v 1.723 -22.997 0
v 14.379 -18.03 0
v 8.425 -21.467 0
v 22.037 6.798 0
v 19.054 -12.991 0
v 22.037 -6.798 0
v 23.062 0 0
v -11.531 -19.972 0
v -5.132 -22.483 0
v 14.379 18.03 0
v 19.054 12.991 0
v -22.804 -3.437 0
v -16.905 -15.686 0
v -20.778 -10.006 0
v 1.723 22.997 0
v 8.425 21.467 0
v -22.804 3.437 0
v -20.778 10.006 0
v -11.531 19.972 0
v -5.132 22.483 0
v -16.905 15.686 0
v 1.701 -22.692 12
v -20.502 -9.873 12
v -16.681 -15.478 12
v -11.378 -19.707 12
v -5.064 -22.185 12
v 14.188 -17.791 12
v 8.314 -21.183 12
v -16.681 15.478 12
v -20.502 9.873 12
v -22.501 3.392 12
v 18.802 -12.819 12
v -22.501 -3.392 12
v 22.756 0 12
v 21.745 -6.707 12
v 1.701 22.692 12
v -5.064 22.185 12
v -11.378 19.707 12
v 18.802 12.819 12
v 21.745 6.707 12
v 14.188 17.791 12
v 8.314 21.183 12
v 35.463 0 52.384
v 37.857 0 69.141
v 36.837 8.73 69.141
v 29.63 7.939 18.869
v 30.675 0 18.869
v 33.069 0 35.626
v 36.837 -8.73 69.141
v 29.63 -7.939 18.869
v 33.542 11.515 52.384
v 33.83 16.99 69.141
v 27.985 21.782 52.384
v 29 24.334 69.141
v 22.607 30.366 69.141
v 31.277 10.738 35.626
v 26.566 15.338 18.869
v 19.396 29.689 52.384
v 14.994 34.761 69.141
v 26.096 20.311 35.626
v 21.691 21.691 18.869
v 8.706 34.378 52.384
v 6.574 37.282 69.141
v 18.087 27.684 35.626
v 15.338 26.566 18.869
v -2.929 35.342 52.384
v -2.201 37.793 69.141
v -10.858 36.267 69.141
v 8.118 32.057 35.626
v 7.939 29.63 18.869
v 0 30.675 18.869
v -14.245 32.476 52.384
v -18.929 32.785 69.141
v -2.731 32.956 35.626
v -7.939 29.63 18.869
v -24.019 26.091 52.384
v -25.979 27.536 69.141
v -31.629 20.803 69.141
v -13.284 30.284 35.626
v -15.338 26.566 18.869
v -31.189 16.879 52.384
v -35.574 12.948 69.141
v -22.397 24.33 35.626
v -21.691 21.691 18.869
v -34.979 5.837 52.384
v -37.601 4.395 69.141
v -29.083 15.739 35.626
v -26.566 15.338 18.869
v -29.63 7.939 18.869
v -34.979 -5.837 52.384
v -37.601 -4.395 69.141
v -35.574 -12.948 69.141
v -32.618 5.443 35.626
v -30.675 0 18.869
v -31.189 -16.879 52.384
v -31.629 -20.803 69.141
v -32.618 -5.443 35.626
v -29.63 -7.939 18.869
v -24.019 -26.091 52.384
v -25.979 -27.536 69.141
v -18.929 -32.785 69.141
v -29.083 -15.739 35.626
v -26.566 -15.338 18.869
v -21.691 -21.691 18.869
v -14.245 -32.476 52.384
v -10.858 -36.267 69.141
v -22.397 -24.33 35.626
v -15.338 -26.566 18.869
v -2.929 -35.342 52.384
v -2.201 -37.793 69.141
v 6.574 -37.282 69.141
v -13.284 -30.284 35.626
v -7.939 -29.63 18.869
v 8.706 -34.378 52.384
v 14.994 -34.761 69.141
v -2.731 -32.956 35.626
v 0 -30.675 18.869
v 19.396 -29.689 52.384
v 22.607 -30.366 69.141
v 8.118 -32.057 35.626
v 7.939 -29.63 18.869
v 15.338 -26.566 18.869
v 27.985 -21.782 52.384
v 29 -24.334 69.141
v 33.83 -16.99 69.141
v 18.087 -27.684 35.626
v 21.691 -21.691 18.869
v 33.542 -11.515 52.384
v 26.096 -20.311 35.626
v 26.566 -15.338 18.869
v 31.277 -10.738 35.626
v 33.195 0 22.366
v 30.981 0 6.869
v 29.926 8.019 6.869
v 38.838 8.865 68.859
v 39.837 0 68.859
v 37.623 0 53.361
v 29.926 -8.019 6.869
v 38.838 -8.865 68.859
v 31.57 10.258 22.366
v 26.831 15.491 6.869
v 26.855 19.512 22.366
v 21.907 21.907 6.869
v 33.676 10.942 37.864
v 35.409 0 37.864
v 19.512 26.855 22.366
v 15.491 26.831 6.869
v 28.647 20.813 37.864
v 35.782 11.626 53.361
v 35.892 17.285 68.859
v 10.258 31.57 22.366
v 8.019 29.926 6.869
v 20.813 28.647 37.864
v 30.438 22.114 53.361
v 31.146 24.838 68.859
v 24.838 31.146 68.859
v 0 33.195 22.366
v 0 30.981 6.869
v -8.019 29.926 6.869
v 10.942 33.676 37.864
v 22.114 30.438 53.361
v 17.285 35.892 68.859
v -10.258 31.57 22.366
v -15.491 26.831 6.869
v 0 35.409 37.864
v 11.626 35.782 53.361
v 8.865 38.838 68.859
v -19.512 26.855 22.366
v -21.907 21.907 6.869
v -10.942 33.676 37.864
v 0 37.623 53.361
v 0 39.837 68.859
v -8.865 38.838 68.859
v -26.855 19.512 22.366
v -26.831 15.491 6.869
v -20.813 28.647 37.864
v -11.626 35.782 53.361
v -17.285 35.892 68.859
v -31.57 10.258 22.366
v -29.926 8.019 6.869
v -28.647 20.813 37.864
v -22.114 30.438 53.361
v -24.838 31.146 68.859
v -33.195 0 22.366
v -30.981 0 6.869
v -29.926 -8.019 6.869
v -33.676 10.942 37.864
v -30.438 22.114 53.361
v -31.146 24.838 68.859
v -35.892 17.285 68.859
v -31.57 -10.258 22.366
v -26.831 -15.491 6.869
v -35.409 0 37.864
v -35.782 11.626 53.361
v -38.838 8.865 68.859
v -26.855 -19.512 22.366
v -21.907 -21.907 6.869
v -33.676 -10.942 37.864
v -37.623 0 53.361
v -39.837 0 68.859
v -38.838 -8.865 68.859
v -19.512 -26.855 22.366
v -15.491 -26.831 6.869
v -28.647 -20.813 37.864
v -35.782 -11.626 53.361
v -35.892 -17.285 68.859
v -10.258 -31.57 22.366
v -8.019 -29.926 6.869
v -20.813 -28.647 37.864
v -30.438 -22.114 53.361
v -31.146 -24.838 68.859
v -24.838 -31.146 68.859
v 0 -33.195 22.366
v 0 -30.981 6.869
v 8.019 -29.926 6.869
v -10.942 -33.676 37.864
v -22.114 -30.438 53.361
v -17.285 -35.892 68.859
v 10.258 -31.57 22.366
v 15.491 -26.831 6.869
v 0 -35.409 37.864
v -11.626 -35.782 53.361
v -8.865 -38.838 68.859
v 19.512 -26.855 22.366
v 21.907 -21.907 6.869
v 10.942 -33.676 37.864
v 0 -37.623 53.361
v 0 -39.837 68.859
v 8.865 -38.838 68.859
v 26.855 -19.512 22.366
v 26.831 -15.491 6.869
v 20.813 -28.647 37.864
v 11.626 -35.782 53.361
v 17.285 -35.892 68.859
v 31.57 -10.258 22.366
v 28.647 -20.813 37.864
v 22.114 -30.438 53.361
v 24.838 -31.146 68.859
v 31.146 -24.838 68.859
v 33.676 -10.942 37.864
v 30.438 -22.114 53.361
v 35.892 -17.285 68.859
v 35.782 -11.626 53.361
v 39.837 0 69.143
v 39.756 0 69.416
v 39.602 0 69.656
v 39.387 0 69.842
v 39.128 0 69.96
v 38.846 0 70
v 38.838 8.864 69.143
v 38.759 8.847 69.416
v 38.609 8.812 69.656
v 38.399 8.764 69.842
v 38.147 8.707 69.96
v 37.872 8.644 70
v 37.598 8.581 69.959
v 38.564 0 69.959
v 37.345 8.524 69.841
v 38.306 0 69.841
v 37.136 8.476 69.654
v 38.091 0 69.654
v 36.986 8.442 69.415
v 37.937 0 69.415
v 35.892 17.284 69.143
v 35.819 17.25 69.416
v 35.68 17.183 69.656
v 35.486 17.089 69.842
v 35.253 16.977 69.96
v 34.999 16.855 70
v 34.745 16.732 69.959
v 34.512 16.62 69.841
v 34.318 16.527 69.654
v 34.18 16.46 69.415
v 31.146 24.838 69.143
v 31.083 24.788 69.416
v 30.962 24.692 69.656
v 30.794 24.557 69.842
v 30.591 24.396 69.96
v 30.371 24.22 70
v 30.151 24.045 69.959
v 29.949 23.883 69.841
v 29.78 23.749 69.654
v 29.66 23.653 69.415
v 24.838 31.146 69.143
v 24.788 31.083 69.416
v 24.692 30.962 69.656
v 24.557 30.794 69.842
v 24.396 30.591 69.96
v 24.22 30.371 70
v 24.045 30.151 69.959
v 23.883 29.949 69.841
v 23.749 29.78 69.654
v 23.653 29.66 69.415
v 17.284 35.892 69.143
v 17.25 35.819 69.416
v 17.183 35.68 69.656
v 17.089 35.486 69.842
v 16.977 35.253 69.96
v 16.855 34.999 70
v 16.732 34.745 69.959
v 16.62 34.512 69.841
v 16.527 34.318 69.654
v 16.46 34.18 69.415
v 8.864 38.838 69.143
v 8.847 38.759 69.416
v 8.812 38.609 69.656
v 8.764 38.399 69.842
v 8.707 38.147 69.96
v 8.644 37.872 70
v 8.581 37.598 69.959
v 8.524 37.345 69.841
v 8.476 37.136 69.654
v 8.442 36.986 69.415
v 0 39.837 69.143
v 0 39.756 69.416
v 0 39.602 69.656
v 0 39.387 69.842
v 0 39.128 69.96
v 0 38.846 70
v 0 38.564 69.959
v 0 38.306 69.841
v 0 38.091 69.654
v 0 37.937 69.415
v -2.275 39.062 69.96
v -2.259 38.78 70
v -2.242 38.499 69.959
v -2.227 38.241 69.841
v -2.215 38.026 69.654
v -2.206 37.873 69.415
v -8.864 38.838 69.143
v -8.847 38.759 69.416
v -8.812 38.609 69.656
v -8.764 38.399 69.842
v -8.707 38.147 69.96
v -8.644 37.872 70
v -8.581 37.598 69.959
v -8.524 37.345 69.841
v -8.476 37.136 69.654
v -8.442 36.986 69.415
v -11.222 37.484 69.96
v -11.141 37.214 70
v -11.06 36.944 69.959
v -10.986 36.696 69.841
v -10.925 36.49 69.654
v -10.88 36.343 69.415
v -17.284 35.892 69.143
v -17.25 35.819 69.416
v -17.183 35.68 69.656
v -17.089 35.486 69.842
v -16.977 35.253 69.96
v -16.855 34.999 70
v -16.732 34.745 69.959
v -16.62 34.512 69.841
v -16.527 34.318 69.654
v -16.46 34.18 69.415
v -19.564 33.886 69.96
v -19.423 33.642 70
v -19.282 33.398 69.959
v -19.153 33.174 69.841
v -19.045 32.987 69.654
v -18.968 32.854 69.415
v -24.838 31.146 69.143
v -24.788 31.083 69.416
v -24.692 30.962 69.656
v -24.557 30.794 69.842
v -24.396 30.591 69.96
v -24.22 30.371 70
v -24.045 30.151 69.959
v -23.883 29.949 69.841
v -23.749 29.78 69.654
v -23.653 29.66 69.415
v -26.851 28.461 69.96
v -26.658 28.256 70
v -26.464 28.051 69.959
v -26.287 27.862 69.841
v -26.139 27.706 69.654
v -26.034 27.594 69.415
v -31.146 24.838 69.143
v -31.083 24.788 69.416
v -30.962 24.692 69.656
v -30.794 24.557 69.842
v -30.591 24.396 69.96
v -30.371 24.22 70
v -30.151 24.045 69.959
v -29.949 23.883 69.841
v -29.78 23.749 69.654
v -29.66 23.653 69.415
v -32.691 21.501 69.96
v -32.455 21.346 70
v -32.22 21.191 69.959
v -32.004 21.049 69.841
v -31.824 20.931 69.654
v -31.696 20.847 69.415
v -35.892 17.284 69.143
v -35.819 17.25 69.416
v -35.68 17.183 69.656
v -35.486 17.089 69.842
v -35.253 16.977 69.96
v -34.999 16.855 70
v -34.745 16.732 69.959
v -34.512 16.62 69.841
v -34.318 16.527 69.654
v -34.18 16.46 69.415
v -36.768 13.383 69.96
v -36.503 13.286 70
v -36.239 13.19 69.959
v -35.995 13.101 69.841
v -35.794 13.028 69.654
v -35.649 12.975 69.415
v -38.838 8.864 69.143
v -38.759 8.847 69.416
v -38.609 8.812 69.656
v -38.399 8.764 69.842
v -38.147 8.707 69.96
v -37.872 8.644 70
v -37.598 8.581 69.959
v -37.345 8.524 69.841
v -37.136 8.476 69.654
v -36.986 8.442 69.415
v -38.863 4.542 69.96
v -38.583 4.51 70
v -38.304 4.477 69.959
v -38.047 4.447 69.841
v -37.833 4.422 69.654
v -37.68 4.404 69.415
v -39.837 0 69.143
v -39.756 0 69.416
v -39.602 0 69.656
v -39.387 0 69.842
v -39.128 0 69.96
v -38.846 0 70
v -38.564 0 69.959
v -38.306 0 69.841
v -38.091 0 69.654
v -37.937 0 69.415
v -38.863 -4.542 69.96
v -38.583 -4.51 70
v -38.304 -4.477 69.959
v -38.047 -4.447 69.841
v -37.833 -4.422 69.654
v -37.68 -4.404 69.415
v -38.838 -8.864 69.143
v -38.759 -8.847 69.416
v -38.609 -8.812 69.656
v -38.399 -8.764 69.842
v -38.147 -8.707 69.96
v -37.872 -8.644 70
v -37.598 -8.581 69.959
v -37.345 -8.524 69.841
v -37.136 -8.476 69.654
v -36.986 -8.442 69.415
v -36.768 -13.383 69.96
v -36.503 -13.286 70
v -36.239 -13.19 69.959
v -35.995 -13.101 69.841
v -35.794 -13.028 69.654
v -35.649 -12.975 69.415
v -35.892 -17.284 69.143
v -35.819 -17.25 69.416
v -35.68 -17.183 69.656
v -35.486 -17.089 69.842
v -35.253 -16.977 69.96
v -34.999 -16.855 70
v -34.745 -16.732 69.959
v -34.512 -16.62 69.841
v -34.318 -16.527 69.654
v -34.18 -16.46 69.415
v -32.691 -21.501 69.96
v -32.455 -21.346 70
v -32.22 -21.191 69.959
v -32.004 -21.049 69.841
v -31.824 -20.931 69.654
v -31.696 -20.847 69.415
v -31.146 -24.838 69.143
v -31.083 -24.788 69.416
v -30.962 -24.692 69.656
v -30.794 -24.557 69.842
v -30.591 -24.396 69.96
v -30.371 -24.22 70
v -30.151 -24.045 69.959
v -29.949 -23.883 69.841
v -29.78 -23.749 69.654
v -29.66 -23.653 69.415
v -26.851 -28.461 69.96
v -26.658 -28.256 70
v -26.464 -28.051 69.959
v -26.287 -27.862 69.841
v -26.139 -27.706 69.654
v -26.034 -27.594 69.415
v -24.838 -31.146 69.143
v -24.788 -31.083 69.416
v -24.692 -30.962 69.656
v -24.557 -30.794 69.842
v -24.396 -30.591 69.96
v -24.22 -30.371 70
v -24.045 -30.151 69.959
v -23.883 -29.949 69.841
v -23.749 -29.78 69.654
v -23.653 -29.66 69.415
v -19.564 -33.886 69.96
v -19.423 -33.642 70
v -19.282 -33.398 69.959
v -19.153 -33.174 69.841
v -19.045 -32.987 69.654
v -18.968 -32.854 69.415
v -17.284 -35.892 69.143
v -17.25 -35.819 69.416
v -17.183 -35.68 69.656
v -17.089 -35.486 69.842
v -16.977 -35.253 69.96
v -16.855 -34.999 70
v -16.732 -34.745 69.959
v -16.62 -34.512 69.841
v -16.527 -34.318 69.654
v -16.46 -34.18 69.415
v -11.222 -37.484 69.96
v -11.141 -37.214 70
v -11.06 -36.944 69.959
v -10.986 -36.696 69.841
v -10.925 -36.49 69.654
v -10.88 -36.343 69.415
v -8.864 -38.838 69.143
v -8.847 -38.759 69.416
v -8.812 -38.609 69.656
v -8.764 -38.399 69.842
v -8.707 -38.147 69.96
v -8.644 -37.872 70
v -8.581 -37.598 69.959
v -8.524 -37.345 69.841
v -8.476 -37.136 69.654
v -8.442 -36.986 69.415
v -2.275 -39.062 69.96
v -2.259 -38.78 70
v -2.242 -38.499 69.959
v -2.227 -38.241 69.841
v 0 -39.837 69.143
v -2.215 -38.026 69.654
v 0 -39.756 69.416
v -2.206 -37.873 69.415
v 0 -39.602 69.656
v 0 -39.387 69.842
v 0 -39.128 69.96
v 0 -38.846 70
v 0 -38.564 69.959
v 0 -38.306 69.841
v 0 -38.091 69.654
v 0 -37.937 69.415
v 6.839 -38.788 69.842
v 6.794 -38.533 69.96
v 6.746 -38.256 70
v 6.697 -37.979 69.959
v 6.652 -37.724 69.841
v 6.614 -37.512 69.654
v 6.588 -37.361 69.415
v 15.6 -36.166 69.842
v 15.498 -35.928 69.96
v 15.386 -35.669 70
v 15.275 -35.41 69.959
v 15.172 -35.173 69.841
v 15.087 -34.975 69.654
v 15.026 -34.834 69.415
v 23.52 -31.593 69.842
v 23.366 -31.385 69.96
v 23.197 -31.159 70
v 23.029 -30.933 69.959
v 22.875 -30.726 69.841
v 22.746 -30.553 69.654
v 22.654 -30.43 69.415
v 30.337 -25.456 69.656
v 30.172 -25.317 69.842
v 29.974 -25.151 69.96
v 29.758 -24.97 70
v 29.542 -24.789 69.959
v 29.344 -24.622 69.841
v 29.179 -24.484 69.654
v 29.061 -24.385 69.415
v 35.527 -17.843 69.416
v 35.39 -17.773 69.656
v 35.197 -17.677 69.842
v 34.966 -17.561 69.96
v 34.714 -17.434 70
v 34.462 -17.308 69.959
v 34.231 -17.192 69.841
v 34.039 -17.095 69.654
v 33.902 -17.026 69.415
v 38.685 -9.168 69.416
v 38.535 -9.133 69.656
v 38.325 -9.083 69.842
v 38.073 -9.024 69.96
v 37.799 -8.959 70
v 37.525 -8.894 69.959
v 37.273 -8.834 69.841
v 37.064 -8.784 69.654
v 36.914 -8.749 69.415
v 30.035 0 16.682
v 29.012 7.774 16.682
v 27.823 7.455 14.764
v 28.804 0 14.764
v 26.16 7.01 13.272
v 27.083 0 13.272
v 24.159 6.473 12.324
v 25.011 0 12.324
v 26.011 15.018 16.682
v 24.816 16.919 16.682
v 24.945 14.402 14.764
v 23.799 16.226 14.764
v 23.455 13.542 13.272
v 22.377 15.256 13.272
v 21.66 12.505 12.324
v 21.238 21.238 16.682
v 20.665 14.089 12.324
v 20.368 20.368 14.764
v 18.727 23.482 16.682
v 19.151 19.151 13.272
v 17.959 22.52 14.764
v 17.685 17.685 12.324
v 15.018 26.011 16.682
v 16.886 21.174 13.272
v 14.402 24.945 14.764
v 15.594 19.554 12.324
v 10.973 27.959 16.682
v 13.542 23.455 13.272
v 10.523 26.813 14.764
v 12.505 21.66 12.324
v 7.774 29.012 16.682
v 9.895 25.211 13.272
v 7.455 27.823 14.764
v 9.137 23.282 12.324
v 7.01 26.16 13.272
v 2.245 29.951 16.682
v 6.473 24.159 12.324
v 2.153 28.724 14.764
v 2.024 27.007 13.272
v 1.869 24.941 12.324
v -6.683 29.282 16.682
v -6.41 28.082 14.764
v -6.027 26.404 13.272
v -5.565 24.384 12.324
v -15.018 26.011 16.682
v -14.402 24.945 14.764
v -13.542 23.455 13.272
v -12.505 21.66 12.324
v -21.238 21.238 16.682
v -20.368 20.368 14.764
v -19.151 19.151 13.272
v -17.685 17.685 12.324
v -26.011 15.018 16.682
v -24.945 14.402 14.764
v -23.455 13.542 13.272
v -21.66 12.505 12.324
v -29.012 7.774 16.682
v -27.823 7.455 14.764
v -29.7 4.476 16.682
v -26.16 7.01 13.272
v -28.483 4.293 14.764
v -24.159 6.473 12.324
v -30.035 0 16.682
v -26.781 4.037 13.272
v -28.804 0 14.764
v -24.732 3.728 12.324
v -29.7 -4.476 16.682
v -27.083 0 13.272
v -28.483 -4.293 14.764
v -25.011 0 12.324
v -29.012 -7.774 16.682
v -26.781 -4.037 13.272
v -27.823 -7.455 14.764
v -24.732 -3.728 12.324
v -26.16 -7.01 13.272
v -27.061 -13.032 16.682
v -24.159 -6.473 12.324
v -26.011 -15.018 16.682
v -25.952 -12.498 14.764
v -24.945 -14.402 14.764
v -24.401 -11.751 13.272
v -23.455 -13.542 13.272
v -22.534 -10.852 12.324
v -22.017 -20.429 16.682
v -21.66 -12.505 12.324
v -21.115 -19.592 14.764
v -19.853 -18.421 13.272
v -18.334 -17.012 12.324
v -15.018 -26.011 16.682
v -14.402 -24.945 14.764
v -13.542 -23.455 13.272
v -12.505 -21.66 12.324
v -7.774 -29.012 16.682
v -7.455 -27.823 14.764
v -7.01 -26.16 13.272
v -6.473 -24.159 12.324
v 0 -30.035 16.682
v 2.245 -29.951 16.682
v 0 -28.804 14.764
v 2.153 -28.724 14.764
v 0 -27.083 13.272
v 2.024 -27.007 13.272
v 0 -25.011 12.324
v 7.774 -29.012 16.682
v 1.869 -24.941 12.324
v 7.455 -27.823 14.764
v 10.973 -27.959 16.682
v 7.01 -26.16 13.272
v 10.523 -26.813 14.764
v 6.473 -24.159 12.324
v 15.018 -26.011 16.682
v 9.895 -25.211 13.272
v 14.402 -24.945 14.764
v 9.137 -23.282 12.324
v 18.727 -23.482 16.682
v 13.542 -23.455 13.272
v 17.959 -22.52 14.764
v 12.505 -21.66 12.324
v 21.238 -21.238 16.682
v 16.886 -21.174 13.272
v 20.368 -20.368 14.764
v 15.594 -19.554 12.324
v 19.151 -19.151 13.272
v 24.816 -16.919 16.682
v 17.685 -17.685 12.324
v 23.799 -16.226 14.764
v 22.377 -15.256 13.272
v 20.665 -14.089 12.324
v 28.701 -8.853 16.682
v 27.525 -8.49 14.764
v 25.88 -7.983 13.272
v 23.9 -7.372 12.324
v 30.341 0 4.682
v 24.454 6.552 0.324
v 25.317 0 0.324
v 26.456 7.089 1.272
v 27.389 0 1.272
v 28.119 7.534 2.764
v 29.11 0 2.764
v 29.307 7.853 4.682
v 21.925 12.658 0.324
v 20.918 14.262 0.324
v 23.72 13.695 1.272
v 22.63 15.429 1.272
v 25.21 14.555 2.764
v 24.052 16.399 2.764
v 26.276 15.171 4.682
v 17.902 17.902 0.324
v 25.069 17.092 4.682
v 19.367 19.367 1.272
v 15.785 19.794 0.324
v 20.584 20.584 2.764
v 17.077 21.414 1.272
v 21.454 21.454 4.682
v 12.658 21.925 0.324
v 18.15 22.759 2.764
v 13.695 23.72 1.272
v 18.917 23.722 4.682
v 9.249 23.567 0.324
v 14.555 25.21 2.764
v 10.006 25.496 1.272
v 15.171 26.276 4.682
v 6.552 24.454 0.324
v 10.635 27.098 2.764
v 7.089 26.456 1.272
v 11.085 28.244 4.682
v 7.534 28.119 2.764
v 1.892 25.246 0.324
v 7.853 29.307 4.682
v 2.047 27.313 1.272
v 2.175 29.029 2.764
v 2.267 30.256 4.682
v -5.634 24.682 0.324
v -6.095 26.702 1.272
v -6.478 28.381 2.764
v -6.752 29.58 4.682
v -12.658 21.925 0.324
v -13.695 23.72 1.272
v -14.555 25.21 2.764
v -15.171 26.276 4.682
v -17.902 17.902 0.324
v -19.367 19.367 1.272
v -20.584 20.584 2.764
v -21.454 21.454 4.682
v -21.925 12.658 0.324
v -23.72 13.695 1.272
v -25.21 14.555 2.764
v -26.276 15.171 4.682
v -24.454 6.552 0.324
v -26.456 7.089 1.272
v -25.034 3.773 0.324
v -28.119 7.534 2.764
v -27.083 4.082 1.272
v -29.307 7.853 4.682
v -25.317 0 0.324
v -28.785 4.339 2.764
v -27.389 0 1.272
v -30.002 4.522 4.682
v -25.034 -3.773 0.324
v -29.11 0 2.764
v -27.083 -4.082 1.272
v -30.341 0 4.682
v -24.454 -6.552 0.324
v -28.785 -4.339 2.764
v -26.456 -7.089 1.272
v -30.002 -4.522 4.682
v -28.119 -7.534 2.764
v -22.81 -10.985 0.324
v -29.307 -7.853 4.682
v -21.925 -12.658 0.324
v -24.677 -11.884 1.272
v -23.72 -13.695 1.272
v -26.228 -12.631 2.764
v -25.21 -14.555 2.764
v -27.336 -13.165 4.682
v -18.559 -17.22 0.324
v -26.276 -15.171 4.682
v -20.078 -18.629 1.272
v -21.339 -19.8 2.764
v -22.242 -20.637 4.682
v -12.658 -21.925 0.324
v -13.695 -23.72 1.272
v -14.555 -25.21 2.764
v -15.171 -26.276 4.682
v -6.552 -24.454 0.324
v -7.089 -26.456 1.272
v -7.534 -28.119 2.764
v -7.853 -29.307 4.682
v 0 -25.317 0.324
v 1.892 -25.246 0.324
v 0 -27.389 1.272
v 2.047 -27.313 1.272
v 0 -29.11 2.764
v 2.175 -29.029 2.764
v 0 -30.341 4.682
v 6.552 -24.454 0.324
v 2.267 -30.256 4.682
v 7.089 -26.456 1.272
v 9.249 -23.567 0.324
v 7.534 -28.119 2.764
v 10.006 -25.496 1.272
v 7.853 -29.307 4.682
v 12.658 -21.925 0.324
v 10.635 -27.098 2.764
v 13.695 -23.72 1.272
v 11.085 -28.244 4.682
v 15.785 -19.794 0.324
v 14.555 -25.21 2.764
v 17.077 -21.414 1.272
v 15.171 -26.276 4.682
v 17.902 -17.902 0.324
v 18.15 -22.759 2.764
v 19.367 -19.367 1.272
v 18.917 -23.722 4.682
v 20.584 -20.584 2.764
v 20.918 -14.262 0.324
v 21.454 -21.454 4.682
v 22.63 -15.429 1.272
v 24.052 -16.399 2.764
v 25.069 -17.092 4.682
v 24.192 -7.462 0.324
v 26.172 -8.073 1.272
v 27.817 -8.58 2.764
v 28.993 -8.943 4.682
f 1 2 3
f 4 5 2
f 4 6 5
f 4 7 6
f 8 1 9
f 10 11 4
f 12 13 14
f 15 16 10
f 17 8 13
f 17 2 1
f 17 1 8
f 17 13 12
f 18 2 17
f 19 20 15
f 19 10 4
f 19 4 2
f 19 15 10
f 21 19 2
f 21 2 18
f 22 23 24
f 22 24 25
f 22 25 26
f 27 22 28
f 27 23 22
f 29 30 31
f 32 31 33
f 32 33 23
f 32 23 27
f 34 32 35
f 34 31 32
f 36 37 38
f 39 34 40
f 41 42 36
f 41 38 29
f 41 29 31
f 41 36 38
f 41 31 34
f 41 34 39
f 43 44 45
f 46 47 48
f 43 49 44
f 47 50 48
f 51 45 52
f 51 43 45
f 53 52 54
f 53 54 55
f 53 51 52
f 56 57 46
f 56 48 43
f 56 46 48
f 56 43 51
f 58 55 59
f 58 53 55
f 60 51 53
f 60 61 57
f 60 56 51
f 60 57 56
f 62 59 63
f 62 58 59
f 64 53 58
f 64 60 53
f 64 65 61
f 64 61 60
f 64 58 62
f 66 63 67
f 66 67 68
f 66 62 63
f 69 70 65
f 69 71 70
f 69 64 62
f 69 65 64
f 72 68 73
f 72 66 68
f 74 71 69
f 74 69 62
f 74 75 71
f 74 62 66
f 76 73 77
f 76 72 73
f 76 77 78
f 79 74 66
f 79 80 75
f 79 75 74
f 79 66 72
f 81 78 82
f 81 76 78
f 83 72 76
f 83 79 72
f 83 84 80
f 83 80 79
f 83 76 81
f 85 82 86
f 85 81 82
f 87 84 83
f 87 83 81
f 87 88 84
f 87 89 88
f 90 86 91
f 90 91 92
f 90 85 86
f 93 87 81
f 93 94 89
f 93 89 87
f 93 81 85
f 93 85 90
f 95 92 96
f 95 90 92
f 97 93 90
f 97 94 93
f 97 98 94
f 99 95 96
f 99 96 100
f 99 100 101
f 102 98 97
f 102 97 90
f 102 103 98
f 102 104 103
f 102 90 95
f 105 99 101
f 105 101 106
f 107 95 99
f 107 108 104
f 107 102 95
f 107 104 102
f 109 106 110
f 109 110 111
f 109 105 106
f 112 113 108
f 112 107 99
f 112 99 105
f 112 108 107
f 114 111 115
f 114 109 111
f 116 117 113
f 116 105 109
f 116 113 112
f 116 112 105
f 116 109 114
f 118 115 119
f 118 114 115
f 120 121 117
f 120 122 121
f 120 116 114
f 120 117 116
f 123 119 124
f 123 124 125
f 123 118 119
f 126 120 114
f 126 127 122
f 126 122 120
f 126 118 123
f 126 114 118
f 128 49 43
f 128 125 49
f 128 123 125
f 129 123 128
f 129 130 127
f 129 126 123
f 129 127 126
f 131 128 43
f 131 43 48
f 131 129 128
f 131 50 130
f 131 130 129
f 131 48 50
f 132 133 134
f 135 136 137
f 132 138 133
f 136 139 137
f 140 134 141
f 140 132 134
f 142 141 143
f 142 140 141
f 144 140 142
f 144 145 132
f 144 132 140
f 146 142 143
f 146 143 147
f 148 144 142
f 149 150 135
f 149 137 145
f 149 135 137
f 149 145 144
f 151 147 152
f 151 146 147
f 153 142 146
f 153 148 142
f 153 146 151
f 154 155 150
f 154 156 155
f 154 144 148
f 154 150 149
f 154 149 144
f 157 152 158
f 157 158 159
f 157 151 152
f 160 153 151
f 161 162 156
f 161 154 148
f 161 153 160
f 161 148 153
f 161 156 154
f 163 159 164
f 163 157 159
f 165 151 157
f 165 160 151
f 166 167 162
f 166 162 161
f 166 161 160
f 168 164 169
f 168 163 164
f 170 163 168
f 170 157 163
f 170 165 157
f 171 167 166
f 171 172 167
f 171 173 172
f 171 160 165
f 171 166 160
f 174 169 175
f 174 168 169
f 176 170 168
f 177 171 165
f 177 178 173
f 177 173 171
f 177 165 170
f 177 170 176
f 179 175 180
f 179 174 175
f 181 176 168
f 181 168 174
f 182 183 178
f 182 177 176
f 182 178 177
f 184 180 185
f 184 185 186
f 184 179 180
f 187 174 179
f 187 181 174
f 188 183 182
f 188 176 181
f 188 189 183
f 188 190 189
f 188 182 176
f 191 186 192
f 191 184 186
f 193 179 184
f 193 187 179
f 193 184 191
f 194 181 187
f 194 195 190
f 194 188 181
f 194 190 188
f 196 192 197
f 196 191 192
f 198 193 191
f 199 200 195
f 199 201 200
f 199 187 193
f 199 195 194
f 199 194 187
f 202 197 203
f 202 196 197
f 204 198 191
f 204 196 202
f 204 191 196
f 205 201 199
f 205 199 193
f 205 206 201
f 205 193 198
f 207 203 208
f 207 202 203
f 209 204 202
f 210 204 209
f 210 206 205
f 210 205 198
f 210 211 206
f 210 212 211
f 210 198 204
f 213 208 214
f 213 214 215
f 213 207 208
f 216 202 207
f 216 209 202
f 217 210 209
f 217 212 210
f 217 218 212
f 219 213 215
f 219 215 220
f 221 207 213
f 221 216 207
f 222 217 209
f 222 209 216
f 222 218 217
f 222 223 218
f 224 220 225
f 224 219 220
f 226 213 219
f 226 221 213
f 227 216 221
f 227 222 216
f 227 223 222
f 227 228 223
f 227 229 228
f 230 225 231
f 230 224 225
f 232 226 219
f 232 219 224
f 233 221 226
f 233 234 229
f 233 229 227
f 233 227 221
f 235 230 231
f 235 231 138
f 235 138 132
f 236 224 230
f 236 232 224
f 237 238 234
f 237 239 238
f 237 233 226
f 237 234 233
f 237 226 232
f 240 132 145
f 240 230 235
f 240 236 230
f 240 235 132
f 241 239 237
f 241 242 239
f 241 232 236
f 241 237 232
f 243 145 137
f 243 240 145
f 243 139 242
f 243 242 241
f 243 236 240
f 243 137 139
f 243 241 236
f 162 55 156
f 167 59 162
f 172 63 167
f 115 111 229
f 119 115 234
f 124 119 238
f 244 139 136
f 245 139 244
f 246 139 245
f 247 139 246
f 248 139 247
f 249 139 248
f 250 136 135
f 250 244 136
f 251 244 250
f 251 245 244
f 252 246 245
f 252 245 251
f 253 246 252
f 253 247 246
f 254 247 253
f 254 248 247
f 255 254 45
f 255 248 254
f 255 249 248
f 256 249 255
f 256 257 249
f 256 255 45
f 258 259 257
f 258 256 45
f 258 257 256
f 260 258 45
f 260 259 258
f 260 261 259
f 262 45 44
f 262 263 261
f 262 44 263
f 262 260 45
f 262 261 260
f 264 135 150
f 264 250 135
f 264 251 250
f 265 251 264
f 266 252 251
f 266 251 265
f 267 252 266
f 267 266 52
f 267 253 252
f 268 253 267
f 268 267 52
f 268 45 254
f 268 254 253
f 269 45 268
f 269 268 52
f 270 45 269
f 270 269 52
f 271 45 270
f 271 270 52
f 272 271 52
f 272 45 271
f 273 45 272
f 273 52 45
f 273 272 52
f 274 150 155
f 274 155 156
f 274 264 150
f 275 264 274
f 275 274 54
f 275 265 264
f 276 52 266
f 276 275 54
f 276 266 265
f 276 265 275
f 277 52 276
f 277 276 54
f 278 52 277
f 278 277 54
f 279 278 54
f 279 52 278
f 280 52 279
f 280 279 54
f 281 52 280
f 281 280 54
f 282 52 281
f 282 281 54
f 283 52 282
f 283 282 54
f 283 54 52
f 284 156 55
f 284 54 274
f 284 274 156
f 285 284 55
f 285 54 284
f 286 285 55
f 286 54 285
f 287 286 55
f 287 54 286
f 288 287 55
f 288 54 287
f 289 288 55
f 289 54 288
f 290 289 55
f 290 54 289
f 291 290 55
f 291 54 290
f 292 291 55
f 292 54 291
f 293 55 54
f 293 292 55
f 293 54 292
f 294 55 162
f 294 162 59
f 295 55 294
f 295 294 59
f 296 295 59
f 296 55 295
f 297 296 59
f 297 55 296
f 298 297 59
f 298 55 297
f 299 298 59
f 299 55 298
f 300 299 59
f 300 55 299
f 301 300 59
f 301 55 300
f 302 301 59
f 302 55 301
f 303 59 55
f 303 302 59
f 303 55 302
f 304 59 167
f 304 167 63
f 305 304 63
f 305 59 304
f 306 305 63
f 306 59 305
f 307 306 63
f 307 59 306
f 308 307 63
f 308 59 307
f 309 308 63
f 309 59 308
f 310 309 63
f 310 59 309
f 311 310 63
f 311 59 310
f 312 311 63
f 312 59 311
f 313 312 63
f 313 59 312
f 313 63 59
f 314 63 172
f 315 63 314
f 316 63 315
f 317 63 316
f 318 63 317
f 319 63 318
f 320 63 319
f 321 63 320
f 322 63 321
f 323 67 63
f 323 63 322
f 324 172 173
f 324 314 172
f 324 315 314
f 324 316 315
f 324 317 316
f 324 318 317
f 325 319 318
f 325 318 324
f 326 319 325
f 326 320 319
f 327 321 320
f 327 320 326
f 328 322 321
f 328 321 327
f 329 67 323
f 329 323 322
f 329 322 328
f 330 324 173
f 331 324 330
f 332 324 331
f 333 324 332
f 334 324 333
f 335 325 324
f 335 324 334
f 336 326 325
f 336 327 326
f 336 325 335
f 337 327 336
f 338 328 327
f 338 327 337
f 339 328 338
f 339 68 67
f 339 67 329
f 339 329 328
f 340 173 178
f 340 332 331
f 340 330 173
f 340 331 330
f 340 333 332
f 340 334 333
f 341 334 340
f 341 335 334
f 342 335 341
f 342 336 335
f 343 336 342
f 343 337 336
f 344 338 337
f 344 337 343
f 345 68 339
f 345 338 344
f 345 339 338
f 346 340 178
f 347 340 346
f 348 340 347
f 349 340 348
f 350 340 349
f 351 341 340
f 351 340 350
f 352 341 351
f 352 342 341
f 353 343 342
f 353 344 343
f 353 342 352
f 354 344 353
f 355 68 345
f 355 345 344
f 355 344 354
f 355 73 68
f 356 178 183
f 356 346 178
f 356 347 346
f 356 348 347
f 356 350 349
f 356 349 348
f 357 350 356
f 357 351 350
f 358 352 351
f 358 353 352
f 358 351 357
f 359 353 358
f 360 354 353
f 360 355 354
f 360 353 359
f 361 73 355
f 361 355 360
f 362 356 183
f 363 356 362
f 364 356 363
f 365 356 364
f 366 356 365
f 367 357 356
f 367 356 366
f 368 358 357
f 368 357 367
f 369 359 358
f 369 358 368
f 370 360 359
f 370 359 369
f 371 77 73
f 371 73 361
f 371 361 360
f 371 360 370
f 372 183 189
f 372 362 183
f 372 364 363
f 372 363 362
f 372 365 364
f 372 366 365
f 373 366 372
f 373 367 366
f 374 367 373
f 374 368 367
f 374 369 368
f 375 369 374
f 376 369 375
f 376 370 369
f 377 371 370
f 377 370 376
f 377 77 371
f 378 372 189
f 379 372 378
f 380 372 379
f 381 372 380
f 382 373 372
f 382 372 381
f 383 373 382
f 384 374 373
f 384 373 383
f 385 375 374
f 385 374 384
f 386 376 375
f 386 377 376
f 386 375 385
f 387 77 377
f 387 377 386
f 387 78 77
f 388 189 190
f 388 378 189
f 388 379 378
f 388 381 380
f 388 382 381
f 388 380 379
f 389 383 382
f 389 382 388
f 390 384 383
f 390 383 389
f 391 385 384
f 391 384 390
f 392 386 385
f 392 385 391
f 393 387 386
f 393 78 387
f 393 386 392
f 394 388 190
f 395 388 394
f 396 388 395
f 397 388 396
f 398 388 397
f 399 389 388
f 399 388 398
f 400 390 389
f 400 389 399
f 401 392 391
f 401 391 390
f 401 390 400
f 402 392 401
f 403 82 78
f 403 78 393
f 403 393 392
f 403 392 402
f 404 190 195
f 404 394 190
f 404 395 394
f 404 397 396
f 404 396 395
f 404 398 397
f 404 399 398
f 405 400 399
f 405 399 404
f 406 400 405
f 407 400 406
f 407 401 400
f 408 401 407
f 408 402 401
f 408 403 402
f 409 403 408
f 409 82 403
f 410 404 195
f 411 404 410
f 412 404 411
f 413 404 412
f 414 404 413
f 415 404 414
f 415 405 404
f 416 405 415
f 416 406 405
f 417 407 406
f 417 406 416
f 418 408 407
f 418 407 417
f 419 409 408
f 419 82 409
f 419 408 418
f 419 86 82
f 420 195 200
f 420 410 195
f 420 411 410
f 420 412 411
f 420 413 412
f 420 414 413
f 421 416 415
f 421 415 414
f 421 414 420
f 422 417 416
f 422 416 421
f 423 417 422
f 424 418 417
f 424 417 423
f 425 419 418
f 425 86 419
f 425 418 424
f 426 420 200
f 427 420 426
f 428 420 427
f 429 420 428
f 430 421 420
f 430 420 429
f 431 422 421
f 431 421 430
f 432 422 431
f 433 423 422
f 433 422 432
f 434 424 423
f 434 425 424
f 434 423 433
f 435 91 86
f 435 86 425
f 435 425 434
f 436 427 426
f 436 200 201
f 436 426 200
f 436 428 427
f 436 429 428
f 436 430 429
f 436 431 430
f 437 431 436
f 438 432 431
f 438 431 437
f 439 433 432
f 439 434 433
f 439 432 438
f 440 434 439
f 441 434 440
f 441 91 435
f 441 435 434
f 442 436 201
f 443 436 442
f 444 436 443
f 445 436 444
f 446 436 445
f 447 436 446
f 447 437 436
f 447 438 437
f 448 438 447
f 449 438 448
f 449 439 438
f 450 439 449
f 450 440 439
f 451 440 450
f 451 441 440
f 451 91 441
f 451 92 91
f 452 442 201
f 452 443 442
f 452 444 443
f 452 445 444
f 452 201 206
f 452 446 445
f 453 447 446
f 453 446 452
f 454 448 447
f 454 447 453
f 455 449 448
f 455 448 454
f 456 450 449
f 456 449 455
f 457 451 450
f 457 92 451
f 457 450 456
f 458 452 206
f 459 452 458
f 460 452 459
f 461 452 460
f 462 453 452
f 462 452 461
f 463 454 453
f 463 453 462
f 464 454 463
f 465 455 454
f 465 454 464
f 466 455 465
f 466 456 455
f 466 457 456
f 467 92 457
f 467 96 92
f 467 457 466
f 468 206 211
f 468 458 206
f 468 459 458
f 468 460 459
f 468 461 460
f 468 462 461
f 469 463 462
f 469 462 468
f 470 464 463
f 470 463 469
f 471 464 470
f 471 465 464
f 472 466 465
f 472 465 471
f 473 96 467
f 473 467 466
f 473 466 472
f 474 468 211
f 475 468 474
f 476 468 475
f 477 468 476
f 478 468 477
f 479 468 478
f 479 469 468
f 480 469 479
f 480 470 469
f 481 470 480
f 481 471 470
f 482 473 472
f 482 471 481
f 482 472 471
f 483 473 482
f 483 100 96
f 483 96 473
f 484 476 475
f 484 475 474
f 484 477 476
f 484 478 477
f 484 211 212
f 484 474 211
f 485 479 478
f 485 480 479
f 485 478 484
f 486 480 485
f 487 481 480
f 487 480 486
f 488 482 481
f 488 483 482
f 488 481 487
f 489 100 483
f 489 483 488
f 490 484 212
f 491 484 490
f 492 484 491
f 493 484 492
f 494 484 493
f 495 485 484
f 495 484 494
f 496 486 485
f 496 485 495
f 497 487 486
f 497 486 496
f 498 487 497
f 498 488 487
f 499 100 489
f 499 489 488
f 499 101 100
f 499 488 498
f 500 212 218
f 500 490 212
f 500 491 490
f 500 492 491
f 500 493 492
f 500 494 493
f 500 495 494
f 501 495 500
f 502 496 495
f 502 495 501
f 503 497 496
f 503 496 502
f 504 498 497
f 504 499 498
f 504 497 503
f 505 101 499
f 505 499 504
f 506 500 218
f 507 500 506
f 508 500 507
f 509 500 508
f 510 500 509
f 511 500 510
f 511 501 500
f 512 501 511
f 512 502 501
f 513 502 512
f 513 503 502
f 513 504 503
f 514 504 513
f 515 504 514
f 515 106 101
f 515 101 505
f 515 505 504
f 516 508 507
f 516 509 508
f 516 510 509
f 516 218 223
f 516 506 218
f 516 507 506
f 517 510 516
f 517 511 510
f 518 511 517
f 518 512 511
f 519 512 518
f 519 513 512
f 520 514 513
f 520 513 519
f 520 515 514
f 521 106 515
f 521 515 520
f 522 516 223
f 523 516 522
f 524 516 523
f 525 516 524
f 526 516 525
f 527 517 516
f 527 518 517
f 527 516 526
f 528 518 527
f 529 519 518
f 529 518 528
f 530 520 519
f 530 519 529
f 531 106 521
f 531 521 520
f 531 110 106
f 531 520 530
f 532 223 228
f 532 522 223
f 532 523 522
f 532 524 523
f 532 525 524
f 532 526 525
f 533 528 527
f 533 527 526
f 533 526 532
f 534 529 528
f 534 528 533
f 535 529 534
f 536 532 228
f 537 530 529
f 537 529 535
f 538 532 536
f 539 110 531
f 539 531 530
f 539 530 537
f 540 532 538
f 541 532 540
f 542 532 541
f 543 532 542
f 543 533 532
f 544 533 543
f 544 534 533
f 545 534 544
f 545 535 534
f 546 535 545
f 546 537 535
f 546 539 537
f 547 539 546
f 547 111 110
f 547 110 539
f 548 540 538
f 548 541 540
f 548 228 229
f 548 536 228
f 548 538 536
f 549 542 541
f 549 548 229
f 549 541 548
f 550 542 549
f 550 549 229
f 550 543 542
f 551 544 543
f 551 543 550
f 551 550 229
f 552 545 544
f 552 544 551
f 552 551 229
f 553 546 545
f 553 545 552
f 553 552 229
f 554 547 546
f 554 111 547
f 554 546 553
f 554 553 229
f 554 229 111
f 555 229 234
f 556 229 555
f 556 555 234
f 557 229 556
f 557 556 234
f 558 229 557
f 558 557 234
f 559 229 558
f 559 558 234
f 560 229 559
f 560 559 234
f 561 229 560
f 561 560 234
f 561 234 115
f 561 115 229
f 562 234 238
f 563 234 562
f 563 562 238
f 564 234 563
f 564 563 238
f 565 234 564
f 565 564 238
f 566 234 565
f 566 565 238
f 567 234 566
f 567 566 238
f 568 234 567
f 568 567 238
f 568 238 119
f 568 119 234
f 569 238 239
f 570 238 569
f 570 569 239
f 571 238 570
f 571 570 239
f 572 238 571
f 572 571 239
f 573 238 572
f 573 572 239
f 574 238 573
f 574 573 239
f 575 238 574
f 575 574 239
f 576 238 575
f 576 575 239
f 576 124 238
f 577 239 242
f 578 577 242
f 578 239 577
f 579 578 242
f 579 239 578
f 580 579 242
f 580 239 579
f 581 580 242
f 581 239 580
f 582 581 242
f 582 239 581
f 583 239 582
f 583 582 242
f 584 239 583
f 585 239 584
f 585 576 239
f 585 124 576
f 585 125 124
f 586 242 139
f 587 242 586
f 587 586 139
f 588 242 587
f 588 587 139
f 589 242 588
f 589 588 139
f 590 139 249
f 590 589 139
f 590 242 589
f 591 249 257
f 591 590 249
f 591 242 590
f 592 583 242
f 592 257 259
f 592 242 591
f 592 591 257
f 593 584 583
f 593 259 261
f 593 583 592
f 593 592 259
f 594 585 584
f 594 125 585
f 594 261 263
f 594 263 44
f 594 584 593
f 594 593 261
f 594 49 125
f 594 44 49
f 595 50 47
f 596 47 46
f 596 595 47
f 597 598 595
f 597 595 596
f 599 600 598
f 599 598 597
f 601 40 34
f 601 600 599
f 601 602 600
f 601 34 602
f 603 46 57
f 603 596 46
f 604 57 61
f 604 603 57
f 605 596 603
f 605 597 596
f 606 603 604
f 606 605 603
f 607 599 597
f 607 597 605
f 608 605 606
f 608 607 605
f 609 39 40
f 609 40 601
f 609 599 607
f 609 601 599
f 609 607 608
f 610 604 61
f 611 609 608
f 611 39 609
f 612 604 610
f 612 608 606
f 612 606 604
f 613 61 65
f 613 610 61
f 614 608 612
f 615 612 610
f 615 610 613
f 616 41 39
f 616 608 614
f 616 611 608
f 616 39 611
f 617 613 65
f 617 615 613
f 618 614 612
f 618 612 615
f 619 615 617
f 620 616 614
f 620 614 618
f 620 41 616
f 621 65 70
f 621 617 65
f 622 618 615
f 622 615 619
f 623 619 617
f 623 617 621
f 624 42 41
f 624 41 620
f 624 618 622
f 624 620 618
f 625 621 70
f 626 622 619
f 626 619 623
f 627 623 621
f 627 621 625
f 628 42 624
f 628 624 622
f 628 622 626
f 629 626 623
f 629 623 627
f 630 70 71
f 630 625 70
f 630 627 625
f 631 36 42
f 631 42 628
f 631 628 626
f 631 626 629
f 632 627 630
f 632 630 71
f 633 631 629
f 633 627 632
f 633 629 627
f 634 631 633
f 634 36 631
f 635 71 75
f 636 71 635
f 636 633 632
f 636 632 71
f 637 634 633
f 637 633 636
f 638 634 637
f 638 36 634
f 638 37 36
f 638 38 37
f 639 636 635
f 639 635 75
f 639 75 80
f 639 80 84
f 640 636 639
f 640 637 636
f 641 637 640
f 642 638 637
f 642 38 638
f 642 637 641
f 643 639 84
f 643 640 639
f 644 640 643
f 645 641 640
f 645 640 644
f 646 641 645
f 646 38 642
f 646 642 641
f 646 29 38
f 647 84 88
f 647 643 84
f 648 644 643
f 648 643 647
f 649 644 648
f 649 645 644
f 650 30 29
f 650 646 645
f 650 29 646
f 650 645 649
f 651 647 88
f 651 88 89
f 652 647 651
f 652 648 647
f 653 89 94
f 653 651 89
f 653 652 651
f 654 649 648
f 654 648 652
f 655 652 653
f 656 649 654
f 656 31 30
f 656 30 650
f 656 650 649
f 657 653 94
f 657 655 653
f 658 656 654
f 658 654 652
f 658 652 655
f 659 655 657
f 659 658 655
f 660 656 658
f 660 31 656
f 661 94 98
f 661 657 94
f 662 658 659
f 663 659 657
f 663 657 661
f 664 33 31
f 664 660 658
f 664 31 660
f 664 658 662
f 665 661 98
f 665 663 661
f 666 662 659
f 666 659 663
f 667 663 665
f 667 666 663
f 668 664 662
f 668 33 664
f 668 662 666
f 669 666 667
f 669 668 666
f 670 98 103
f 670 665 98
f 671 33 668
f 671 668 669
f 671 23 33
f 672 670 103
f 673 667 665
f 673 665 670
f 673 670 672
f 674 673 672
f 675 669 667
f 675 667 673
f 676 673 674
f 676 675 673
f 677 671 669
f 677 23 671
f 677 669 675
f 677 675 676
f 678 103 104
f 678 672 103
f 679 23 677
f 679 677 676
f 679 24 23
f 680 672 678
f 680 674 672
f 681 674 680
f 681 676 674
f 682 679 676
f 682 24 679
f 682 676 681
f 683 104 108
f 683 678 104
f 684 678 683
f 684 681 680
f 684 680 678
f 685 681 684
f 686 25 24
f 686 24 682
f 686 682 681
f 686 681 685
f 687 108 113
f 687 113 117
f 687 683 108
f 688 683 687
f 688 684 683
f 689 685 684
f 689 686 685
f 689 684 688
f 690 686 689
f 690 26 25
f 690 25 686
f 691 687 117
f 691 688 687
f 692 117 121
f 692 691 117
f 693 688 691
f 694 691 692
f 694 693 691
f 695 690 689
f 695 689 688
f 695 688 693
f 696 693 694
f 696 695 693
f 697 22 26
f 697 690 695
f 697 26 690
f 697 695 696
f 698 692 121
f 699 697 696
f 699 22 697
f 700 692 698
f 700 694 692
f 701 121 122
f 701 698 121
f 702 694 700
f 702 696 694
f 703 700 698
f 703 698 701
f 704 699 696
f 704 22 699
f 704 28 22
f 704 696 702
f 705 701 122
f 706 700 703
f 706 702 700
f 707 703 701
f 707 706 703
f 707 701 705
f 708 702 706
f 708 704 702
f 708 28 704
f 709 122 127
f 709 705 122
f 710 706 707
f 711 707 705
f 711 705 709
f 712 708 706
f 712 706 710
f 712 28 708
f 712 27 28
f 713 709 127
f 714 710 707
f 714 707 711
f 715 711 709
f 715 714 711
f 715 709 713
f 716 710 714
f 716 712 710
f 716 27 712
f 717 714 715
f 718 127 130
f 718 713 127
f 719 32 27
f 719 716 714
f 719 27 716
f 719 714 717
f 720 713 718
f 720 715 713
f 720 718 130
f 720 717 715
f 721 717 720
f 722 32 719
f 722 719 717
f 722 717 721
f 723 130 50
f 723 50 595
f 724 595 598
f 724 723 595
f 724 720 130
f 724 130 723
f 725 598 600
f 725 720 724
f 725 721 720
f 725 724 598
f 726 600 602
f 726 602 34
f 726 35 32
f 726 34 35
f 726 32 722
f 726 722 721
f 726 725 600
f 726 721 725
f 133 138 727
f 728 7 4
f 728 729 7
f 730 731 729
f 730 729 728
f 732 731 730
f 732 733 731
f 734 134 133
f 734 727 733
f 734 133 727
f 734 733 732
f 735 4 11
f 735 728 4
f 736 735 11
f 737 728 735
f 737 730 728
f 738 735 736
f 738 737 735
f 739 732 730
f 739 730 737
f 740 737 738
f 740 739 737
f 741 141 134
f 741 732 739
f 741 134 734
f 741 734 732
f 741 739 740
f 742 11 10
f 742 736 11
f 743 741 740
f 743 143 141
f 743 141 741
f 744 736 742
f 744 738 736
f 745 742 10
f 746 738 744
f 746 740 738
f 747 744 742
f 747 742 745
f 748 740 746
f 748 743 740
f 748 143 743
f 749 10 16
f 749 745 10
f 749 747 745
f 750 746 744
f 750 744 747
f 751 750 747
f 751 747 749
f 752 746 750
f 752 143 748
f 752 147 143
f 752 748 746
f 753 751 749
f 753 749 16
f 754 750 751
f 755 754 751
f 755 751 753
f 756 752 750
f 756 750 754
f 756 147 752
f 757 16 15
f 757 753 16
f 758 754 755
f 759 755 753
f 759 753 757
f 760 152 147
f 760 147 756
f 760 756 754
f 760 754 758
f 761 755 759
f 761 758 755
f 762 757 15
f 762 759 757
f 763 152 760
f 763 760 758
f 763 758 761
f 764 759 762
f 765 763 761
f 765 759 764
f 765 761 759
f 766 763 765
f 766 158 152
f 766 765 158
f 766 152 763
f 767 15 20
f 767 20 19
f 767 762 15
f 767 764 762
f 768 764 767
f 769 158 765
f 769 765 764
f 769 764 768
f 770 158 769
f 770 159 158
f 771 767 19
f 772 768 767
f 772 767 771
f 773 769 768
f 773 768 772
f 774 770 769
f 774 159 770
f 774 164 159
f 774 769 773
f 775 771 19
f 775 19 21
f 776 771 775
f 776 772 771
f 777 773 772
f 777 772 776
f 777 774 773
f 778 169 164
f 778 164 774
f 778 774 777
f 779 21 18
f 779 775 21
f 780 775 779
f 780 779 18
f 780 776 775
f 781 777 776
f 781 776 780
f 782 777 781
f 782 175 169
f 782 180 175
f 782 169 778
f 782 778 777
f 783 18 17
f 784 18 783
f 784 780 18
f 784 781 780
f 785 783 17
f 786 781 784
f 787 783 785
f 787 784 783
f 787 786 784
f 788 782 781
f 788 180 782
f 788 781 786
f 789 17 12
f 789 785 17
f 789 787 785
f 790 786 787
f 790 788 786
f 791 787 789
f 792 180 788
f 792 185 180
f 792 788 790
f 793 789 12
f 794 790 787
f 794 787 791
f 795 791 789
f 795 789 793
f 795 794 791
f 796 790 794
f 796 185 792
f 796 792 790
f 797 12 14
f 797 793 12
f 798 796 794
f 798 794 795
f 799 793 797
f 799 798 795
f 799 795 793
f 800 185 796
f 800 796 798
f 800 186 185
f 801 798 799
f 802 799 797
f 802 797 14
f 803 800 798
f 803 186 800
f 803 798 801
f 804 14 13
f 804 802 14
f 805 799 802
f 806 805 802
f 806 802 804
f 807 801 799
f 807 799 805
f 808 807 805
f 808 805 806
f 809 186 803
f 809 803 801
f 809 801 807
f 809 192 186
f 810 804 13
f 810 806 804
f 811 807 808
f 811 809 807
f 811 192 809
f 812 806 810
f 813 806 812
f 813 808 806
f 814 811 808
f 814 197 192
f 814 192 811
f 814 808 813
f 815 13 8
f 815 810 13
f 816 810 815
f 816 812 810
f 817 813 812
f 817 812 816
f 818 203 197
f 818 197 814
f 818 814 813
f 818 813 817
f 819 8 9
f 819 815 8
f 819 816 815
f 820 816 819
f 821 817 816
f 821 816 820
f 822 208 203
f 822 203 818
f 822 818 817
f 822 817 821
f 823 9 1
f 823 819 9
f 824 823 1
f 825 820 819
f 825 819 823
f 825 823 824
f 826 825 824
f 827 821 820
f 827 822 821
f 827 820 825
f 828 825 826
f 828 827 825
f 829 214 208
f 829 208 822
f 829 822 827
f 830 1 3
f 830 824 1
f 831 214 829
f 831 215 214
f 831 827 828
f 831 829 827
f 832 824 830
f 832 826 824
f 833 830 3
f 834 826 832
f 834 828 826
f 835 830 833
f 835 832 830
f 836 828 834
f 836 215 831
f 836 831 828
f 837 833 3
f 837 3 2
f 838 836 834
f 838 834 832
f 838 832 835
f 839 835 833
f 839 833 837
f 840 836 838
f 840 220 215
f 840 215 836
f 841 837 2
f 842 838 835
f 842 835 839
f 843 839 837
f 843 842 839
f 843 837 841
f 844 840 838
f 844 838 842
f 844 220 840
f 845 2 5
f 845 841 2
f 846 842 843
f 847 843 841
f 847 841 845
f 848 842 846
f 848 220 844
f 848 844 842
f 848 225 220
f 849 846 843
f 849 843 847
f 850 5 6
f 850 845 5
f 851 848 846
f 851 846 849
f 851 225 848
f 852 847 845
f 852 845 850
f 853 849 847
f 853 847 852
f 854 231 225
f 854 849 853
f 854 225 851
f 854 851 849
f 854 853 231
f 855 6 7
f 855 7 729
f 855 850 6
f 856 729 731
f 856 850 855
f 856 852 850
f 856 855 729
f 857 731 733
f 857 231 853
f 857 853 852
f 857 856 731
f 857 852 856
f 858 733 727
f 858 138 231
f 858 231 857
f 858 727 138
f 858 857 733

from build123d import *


with BuildPart() as f1:
    # F0 (on Front) → F1 (revolve)
    with BuildSketch(Plane.XZ):
        with BuildLine():
            Line((0, 12), (0, 0))
            Line((0, 0), (23.061637, 0))
            ThreePointArc((23.061637, 0), (28.303251, 1.956368), (30.981233, 6.868629))
            Line((30.981233, 6.868629), (39.83694, 68.858579))
            ThreePointArc((39.83694, 68.858579), (38.988412, 69.989949), (37.857041, 69.141421))
            Line((37.857041, 69.141421), (30.675213, 18.868629))
            ThreePointArc((30.675213, 18.868629), (27.997231, 13.956368), (22.755617, 12))
            Line((22.755617, 12), (0, 12))
        make_face()
    revolve(axis=Axis((0, 0, 45.796357), (0, 0, 1)))


solid = f1.part
